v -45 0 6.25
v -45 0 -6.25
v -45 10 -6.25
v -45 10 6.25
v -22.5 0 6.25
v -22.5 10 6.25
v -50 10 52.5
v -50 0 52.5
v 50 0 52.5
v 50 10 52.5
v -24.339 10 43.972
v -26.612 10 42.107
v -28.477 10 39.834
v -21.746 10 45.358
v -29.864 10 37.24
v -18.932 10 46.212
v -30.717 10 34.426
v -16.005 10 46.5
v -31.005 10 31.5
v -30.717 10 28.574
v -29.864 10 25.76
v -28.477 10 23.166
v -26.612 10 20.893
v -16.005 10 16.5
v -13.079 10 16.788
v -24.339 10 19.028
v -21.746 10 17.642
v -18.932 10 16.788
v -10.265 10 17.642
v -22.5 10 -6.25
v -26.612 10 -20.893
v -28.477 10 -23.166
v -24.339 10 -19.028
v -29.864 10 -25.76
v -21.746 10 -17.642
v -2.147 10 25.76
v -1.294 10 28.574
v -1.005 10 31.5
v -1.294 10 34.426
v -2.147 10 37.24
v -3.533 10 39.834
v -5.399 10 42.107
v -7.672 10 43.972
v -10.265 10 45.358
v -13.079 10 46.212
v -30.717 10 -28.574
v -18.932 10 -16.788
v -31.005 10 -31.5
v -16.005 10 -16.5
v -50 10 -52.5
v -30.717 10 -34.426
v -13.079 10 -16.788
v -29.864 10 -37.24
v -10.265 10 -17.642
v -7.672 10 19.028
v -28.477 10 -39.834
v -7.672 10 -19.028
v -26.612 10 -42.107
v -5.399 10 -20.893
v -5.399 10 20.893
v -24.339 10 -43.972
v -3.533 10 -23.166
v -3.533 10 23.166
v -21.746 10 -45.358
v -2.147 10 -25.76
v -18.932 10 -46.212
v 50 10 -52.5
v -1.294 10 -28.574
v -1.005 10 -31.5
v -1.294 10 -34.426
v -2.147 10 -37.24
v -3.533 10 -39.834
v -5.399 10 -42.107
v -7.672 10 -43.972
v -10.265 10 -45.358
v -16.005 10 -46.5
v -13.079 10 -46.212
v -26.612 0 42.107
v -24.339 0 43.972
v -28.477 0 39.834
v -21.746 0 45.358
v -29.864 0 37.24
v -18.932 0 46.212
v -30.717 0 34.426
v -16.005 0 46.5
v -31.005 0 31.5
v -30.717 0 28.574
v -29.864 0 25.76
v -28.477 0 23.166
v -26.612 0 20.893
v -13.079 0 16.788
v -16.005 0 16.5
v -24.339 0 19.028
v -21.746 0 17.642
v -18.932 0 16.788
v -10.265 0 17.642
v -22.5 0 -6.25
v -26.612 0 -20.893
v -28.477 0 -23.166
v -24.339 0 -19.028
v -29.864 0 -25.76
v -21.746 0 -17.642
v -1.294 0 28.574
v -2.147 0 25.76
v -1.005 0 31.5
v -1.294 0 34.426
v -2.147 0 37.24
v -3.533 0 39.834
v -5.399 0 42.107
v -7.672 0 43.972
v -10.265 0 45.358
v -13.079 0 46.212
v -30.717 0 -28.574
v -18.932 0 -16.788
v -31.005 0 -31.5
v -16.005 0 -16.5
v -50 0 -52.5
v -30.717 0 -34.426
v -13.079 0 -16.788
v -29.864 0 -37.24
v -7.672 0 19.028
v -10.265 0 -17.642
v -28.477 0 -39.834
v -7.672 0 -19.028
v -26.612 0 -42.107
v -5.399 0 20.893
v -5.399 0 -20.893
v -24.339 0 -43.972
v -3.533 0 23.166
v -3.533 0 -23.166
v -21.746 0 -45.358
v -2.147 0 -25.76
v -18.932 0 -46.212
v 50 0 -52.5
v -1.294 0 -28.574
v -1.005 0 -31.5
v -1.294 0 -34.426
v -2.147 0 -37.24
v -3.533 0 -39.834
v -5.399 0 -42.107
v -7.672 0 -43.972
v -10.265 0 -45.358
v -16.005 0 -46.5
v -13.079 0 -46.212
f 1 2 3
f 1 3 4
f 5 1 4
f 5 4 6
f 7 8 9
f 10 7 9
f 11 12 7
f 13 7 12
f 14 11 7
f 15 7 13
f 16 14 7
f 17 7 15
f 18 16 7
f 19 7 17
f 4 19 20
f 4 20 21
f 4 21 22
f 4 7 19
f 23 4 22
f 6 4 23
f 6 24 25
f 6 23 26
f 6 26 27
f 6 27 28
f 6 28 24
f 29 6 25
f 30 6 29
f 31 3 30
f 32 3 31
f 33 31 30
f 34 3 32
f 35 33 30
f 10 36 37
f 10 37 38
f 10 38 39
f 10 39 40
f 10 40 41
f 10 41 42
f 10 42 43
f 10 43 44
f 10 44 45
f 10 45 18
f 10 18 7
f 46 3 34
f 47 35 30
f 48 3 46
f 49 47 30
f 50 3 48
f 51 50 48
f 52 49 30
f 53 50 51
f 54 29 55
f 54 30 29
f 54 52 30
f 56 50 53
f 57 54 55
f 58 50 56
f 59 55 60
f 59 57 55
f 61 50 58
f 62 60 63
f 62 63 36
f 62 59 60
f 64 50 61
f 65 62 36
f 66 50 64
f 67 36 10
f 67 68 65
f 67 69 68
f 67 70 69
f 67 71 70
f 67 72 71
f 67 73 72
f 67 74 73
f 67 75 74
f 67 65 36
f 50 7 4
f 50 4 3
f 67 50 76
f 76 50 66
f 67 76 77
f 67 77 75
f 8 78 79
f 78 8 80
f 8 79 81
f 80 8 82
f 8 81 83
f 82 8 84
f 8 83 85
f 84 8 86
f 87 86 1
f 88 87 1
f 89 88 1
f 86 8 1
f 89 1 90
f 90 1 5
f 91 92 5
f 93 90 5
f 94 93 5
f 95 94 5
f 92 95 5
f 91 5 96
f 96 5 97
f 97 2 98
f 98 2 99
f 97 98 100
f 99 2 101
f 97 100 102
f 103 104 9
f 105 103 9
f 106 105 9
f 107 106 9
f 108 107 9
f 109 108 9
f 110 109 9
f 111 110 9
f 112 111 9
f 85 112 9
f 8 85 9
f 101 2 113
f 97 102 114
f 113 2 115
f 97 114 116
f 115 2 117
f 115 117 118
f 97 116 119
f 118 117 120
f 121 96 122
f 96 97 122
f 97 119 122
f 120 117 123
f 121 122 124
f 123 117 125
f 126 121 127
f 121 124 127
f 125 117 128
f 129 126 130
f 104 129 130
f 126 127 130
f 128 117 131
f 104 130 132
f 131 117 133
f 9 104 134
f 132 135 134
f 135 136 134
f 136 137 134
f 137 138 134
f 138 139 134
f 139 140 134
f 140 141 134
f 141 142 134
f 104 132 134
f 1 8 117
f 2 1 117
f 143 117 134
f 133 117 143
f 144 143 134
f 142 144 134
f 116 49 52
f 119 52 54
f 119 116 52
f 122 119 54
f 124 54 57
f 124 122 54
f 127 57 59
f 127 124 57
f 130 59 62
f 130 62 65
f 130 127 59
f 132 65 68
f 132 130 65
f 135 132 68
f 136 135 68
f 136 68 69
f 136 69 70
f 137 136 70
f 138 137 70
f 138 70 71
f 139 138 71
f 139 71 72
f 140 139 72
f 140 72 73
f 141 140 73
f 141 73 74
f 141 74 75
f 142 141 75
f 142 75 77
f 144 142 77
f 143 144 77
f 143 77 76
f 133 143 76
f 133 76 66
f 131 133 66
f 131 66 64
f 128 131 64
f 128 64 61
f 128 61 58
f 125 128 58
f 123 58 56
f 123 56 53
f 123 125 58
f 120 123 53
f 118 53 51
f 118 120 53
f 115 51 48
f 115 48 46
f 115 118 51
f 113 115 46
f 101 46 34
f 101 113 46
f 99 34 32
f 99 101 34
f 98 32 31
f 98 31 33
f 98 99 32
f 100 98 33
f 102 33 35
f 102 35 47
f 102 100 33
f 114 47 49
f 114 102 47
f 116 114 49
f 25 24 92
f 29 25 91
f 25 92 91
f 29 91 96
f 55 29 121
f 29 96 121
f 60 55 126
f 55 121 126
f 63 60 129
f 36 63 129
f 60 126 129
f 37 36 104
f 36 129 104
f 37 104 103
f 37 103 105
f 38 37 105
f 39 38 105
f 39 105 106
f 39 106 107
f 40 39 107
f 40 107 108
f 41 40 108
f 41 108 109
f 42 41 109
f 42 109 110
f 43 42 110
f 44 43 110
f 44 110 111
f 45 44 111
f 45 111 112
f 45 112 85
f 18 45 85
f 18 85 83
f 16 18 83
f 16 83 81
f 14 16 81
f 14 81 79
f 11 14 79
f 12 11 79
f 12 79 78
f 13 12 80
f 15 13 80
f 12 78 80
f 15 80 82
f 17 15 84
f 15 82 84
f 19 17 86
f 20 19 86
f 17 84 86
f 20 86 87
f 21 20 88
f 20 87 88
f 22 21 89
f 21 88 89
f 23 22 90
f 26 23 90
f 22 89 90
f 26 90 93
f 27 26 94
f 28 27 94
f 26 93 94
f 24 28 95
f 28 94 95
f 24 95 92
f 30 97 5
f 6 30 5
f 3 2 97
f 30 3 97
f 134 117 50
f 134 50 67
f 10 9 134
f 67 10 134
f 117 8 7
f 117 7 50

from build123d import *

# Parameters (mm, degrees)
SKETCH2_W           = 100
SKETCH2_H           = 105
BOSS_EXTRUDE1_DEPTH = 10
CUT_EXTRUDE1_REACH  = 75.186
SKETCH5_R           = 15
SKETCH5_R_2         = 5
CUT_EXTRUDE2_REACH  = 75.186
SKETCH6_W           = 22.5
SKETCH6_H           = 12.5


with BuildPart() as part:
    # Sketch2 → Boss-Extrude1 (new body)
    with BuildSketch(Plane(origin=(0, 0, 0), x_dir=(1, 0, 0), z_dir=(0, 1, 0))):
        Rectangle(SKETCH2_W, SKETCH2_H)
    extrude(amount=BOSS_EXTRUDE1_DEPTH)

    # Sketch5 → Cut-Extrude1 (cut, up to next)
    with BuildSketch(Plane.XZ, mode=Mode.PRIVATE) as cut_extrude1_sk1:
        with Locations(Location((-16.005435425, 31.5, 0), (0, 0, 270))):
            Circle(SKETCH5_R)
    cut_extrude1_tool1 = extrude(cut_extrude1_sk1.sketch, amount=-CUT_EXTRUDE1_REACH, mode=Mode.PRIVATE) & part.part
    # Sketch5 → Cut-Extrude1 (cut, up to next)
    with BuildSketch(Plane.XZ, mode=Mode.PRIVATE) as cut_extrude1_sk2:
        with Locations(Location((-39, 0, 0), (0, 0, 270))):
            Circle(SKETCH5_R_2)
    cut_extrude1_tool2 = extrude(cut_extrude1_sk2.sketch, amount=-CUT_EXTRUDE1_REACH, mode=Mode.PRIVATE) & part.part
    cut_extrude1_1 = cut_extrude1_tool1.solids().sort_by_distance((-16.005435, 0, 31.5))[0]
    add(cut_extrude1_1, mode=Mode.SUBTRACT)
    cut_extrude1_2 = cut_extrude1_tool2.solids().sort_by_distance((-39, 0, 0))[0]
    add(cut_extrude1_2, mode=Mode.SUBTRACT)
    cut_extrude1 = cut_extrude1_1 + cut_extrude1_2  # Cut-Extrude1 as one shape, for the pattern or mirror that repeats it

    # Mirror1: Cut-Extrude1 across plane
    add(cut_extrude1.mirror(Plane.XY), mode=Mode.SUBTRACT)

    # Sketch6 → Cut-Extrude2 (cut, up to next)
    with BuildSketch(Plane.XZ, mode=Mode.PRIVATE) as cut_extrude2_sk1:
        with Locations((-33.75, 0)):
            Rectangle(SKETCH6_W, SKETCH6_H)
    cut_extrude2_tool1 = extrude(cut_extrude2_sk1.sketch, amount=-CUT_EXTRUDE2_REACH, mode=Mode.PRIVATE) & part.part
    add(cut_extrude2_tool1.solids().sort_by_distance((-33.75, 0, 0))[0], mode=Mode.SUBTRACT)


solid = part.part
